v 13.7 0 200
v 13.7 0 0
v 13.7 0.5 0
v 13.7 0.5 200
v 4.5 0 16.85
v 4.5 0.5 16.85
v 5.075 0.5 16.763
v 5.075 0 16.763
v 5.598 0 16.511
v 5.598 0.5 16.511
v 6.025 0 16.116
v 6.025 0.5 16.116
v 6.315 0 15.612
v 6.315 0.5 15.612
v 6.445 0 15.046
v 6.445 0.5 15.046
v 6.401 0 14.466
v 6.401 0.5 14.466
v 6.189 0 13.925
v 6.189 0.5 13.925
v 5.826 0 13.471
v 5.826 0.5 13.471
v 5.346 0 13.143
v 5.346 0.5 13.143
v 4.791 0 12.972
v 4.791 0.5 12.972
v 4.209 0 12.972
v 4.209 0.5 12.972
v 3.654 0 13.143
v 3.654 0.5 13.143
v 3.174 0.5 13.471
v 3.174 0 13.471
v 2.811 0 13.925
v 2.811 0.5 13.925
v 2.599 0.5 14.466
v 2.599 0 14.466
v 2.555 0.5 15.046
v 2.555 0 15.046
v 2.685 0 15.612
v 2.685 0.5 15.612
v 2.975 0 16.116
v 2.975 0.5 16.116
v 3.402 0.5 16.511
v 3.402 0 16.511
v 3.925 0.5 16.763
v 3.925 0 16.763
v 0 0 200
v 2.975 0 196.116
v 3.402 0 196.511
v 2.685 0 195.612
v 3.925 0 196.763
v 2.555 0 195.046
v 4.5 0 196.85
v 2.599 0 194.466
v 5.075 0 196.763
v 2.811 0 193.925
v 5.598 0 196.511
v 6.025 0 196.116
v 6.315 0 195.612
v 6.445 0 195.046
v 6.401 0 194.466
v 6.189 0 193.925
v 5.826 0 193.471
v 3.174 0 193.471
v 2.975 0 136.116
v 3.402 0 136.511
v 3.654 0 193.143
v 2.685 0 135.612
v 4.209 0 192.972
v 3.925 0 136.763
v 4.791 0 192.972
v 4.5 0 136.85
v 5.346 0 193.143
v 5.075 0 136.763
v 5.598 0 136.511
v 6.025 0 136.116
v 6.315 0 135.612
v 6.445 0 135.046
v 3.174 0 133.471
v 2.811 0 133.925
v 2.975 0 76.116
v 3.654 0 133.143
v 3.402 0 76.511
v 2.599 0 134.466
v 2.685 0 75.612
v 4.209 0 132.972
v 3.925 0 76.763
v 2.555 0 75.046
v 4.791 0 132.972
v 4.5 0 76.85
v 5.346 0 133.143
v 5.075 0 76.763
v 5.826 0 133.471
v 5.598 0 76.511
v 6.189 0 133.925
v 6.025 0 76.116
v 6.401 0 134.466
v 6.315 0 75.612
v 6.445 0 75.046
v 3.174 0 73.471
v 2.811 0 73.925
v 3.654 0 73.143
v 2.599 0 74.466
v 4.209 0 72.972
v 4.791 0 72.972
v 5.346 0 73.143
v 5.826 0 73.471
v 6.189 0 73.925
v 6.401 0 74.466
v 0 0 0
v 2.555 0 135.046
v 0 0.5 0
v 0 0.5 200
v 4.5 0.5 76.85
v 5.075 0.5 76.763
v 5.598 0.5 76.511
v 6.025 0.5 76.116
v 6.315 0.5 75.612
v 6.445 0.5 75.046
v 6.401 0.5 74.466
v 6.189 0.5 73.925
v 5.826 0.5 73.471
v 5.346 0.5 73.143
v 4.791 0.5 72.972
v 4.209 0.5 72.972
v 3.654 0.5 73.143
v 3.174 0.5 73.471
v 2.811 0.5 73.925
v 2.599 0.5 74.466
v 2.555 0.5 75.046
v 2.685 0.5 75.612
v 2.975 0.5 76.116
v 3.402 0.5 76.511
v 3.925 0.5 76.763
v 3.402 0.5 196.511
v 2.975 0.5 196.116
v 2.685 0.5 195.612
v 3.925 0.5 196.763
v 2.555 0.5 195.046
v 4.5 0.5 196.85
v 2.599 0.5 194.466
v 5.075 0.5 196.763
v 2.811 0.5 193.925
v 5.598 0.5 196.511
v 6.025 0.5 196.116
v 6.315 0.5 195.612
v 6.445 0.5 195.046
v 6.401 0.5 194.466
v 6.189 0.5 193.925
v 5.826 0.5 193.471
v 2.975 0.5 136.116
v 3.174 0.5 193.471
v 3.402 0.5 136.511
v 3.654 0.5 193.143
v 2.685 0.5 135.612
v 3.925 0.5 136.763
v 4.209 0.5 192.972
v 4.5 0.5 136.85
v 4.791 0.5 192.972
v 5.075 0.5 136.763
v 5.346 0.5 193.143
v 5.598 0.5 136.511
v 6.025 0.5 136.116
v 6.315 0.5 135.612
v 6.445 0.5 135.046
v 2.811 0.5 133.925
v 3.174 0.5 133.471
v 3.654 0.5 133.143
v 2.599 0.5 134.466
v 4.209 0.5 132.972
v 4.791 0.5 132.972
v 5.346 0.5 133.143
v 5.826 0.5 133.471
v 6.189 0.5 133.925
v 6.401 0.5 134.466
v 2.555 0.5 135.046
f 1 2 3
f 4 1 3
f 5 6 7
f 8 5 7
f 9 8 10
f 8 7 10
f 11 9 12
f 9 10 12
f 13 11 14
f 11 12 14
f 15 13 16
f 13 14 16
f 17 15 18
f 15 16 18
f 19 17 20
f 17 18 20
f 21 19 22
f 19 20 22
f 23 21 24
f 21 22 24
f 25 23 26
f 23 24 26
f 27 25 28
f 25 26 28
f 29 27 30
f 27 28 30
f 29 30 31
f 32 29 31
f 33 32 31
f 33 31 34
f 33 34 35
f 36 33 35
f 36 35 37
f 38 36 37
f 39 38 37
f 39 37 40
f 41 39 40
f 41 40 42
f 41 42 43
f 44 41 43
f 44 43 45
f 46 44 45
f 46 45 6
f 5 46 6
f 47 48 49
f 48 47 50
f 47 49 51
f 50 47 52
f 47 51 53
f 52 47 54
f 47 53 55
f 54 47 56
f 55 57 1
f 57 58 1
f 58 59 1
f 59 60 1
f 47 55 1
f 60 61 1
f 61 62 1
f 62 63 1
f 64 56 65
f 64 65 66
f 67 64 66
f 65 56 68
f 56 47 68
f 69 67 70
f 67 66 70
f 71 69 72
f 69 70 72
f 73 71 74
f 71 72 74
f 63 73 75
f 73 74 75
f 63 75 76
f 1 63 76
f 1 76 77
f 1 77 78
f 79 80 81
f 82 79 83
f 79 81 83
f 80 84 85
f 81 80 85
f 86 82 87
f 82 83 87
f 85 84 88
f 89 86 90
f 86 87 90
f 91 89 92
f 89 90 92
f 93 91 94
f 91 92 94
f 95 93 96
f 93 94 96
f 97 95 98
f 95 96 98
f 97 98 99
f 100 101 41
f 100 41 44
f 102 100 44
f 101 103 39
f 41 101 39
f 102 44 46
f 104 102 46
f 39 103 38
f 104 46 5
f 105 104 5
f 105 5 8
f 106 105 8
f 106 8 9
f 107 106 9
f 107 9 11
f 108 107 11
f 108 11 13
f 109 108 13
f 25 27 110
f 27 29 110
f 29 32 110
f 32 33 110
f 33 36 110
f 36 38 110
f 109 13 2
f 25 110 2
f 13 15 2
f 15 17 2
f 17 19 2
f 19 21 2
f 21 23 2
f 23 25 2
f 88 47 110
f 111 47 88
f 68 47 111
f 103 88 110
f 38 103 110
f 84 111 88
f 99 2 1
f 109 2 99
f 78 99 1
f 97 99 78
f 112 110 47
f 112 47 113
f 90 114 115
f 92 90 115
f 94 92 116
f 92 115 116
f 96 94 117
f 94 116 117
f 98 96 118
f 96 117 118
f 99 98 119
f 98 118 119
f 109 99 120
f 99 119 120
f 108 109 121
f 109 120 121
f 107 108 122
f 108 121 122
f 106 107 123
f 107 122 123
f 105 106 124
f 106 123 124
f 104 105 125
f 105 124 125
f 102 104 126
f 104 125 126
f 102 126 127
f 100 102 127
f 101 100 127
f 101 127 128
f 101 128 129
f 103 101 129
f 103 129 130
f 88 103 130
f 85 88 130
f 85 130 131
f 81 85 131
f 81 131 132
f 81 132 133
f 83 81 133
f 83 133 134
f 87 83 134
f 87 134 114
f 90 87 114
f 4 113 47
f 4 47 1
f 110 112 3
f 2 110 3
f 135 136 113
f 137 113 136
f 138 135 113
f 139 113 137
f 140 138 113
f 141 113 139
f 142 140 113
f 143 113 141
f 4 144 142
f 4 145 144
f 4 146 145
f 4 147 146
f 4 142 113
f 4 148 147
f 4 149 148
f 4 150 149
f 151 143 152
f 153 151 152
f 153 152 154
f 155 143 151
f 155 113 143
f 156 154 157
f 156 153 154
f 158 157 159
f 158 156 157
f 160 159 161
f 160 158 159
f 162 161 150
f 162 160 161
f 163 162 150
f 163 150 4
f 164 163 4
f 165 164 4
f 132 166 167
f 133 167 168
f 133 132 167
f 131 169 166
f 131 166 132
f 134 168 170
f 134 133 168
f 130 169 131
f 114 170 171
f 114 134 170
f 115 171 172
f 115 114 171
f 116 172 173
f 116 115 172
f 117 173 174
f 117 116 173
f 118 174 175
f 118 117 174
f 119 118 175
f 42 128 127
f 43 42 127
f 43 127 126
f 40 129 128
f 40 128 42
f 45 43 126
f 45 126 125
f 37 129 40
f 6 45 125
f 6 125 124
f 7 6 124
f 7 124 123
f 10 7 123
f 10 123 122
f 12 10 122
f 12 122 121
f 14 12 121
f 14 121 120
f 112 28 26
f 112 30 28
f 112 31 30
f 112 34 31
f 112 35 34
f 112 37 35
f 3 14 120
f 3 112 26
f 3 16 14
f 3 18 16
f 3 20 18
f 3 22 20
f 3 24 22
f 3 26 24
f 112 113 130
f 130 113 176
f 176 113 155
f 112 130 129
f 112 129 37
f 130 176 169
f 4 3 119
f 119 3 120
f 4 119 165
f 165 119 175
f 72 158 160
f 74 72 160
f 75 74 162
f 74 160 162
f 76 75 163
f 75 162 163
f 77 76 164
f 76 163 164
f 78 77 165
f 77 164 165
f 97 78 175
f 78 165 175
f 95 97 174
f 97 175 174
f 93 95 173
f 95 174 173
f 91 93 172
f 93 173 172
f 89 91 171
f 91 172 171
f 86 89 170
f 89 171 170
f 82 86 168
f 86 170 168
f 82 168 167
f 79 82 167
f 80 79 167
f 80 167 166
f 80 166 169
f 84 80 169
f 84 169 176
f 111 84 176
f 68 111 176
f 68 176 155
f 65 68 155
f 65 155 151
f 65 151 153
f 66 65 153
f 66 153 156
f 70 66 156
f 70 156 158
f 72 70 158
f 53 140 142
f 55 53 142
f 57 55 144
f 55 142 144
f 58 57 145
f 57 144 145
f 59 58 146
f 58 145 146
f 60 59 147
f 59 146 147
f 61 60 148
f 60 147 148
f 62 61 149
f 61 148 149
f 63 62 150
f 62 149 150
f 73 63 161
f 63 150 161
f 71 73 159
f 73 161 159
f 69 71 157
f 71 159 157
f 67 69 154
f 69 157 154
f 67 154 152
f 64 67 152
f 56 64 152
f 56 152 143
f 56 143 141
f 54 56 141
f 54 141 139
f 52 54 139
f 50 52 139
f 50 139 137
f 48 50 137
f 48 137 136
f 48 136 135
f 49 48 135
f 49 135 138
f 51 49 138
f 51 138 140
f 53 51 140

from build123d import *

# Parameters (mm, degrees)
ESQUISSE1_W             = 13.7
ESQUISSE1_H             = 0.5
BOSS_EXTRU_1_DEPTH      = 200
ENL_V_MAT_EXTRU_1_REACH = 202.469
ESQUISSE2_R             = 1.95


with BuildPart() as part:
    # Esquisse1 → Boss.-Extru.1 (new body)
    with BuildSketch(Plane.XY):
        with Locations((6.85, 0.25)):
            Rectangle(ESQUISSE1_W, ESQUISSE1_H)
    extrude(amount=BOSS_EXTRU_1_DEPTH)

    # Esquisse2 → Enlèv. mat.-Extru.1 (cut, up to next)
    with BuildSketch(Plane(origin=(0, 0.5, 0), x_dir=(1, 0, 0), z_dir=(0, 1, 0)), mode=Mode.PRIVATE) as enl_v_mat_extru_1_sk1:
        with Locations(Location((4.5, -14.9, 0), (0, 0, 270))):
            Circle(ESQUISSE2_R)
    enl_v_mat_extru_1_tool1 = extrude(enl_v_mat_extru_1_sk1.sketch, amount=-ENL_V_MAT_EXTRU_1_REACH, mode=Mode.PRIVATE) & part.part
    # Esquisse2 → Enlèv. mat.-Extru.1 (cut, up to next)
    with BuildSketch(Plane(origin=(0, 0.5, 0), x_dir=(1, 0, 0), z_dir=(0, 1, 0)), mode=Mode.PRIVATE) as enl_v_mat_extru_1_sk2:
        with Locations(Location((4.5, -74.9, 0), (0, 0, 270))):
            Circle(ESQUISSE2_R)
    enl_v_mat_extru_1_tool2 = extrude(enl_v_mat_extru_1_sk2.sketch, amount=-ENL_V_MAT_EXTRU_1_REACH, mode=Mode.PRIVATE) & part.part
    # Esquisse2 → Enlèv. mat.-Extru.1 (cut, up to next)
    with BuildSketch(Plane(origin=(0, 0.5, 0), x_dir=(1, 0, 0), z_dir=(0, 1, 0)), mode=Mode.PRIVATE) as enl_v_mat_extru_1_sk3:
        with Locations(Location((4.5, -134.9, 0), (0, 0, 270))):
            Circle(ESQUISSE2_R)
    enl_v_mat_extru_1_tool3 = extrude(enl_v_mat_extru_1_sk3.sketch, amount=-ENL_V_MAT_EXTRU_1_REACH, mode=Mode.PRIVATE) & part.part
    # Esquisse2 → Enlèv. mat.-Extru.1 (cut, up to next)
    with BuildSketch(Plane(origin=(0, 0.5, 0), x_dir=(1, 0, 0), z_dir=(0, 1, 0)), mode=Mode.PRIVATE) as enl_v_mat_extru_1_sk4:
        with Locations(Location((4.5, -194.9, 0), (0, 0, 270))):
            Circle(ESQUISSE2_R)
    enl_v_mat_extru_1_tool4 = extrude(enl_v_mat_extru_1_sk4.sketch, amount=-ENL_V_MAT_EXTRU_1_REACH, mode=Mode.PRIVATE) & part.part
    add(enl_v_mat_extru_1_tool1.solids().sort_by_distance((4.5, 0.5, 14.9))[0], mode=Mode.SUBTRACT)
    add(enl_v_mat_extru_1_tool2.solids().sort_by_distance((4.5, 0.5, 74.9))[0], mode=Mode.SUBTRACT)
    add(enl_v_mat_extru_1_tool3.solids().sort_by_distance((4.5, 0.5, 134.9))[0], mode=Mode.SUBTRACT)
    add(enl_v_mat_extru_1_tool4.solids().sort_by_distance((4.5, 0.5, 194.9))[0], mode=Mode.SUBTRACT)


solid = part.part
